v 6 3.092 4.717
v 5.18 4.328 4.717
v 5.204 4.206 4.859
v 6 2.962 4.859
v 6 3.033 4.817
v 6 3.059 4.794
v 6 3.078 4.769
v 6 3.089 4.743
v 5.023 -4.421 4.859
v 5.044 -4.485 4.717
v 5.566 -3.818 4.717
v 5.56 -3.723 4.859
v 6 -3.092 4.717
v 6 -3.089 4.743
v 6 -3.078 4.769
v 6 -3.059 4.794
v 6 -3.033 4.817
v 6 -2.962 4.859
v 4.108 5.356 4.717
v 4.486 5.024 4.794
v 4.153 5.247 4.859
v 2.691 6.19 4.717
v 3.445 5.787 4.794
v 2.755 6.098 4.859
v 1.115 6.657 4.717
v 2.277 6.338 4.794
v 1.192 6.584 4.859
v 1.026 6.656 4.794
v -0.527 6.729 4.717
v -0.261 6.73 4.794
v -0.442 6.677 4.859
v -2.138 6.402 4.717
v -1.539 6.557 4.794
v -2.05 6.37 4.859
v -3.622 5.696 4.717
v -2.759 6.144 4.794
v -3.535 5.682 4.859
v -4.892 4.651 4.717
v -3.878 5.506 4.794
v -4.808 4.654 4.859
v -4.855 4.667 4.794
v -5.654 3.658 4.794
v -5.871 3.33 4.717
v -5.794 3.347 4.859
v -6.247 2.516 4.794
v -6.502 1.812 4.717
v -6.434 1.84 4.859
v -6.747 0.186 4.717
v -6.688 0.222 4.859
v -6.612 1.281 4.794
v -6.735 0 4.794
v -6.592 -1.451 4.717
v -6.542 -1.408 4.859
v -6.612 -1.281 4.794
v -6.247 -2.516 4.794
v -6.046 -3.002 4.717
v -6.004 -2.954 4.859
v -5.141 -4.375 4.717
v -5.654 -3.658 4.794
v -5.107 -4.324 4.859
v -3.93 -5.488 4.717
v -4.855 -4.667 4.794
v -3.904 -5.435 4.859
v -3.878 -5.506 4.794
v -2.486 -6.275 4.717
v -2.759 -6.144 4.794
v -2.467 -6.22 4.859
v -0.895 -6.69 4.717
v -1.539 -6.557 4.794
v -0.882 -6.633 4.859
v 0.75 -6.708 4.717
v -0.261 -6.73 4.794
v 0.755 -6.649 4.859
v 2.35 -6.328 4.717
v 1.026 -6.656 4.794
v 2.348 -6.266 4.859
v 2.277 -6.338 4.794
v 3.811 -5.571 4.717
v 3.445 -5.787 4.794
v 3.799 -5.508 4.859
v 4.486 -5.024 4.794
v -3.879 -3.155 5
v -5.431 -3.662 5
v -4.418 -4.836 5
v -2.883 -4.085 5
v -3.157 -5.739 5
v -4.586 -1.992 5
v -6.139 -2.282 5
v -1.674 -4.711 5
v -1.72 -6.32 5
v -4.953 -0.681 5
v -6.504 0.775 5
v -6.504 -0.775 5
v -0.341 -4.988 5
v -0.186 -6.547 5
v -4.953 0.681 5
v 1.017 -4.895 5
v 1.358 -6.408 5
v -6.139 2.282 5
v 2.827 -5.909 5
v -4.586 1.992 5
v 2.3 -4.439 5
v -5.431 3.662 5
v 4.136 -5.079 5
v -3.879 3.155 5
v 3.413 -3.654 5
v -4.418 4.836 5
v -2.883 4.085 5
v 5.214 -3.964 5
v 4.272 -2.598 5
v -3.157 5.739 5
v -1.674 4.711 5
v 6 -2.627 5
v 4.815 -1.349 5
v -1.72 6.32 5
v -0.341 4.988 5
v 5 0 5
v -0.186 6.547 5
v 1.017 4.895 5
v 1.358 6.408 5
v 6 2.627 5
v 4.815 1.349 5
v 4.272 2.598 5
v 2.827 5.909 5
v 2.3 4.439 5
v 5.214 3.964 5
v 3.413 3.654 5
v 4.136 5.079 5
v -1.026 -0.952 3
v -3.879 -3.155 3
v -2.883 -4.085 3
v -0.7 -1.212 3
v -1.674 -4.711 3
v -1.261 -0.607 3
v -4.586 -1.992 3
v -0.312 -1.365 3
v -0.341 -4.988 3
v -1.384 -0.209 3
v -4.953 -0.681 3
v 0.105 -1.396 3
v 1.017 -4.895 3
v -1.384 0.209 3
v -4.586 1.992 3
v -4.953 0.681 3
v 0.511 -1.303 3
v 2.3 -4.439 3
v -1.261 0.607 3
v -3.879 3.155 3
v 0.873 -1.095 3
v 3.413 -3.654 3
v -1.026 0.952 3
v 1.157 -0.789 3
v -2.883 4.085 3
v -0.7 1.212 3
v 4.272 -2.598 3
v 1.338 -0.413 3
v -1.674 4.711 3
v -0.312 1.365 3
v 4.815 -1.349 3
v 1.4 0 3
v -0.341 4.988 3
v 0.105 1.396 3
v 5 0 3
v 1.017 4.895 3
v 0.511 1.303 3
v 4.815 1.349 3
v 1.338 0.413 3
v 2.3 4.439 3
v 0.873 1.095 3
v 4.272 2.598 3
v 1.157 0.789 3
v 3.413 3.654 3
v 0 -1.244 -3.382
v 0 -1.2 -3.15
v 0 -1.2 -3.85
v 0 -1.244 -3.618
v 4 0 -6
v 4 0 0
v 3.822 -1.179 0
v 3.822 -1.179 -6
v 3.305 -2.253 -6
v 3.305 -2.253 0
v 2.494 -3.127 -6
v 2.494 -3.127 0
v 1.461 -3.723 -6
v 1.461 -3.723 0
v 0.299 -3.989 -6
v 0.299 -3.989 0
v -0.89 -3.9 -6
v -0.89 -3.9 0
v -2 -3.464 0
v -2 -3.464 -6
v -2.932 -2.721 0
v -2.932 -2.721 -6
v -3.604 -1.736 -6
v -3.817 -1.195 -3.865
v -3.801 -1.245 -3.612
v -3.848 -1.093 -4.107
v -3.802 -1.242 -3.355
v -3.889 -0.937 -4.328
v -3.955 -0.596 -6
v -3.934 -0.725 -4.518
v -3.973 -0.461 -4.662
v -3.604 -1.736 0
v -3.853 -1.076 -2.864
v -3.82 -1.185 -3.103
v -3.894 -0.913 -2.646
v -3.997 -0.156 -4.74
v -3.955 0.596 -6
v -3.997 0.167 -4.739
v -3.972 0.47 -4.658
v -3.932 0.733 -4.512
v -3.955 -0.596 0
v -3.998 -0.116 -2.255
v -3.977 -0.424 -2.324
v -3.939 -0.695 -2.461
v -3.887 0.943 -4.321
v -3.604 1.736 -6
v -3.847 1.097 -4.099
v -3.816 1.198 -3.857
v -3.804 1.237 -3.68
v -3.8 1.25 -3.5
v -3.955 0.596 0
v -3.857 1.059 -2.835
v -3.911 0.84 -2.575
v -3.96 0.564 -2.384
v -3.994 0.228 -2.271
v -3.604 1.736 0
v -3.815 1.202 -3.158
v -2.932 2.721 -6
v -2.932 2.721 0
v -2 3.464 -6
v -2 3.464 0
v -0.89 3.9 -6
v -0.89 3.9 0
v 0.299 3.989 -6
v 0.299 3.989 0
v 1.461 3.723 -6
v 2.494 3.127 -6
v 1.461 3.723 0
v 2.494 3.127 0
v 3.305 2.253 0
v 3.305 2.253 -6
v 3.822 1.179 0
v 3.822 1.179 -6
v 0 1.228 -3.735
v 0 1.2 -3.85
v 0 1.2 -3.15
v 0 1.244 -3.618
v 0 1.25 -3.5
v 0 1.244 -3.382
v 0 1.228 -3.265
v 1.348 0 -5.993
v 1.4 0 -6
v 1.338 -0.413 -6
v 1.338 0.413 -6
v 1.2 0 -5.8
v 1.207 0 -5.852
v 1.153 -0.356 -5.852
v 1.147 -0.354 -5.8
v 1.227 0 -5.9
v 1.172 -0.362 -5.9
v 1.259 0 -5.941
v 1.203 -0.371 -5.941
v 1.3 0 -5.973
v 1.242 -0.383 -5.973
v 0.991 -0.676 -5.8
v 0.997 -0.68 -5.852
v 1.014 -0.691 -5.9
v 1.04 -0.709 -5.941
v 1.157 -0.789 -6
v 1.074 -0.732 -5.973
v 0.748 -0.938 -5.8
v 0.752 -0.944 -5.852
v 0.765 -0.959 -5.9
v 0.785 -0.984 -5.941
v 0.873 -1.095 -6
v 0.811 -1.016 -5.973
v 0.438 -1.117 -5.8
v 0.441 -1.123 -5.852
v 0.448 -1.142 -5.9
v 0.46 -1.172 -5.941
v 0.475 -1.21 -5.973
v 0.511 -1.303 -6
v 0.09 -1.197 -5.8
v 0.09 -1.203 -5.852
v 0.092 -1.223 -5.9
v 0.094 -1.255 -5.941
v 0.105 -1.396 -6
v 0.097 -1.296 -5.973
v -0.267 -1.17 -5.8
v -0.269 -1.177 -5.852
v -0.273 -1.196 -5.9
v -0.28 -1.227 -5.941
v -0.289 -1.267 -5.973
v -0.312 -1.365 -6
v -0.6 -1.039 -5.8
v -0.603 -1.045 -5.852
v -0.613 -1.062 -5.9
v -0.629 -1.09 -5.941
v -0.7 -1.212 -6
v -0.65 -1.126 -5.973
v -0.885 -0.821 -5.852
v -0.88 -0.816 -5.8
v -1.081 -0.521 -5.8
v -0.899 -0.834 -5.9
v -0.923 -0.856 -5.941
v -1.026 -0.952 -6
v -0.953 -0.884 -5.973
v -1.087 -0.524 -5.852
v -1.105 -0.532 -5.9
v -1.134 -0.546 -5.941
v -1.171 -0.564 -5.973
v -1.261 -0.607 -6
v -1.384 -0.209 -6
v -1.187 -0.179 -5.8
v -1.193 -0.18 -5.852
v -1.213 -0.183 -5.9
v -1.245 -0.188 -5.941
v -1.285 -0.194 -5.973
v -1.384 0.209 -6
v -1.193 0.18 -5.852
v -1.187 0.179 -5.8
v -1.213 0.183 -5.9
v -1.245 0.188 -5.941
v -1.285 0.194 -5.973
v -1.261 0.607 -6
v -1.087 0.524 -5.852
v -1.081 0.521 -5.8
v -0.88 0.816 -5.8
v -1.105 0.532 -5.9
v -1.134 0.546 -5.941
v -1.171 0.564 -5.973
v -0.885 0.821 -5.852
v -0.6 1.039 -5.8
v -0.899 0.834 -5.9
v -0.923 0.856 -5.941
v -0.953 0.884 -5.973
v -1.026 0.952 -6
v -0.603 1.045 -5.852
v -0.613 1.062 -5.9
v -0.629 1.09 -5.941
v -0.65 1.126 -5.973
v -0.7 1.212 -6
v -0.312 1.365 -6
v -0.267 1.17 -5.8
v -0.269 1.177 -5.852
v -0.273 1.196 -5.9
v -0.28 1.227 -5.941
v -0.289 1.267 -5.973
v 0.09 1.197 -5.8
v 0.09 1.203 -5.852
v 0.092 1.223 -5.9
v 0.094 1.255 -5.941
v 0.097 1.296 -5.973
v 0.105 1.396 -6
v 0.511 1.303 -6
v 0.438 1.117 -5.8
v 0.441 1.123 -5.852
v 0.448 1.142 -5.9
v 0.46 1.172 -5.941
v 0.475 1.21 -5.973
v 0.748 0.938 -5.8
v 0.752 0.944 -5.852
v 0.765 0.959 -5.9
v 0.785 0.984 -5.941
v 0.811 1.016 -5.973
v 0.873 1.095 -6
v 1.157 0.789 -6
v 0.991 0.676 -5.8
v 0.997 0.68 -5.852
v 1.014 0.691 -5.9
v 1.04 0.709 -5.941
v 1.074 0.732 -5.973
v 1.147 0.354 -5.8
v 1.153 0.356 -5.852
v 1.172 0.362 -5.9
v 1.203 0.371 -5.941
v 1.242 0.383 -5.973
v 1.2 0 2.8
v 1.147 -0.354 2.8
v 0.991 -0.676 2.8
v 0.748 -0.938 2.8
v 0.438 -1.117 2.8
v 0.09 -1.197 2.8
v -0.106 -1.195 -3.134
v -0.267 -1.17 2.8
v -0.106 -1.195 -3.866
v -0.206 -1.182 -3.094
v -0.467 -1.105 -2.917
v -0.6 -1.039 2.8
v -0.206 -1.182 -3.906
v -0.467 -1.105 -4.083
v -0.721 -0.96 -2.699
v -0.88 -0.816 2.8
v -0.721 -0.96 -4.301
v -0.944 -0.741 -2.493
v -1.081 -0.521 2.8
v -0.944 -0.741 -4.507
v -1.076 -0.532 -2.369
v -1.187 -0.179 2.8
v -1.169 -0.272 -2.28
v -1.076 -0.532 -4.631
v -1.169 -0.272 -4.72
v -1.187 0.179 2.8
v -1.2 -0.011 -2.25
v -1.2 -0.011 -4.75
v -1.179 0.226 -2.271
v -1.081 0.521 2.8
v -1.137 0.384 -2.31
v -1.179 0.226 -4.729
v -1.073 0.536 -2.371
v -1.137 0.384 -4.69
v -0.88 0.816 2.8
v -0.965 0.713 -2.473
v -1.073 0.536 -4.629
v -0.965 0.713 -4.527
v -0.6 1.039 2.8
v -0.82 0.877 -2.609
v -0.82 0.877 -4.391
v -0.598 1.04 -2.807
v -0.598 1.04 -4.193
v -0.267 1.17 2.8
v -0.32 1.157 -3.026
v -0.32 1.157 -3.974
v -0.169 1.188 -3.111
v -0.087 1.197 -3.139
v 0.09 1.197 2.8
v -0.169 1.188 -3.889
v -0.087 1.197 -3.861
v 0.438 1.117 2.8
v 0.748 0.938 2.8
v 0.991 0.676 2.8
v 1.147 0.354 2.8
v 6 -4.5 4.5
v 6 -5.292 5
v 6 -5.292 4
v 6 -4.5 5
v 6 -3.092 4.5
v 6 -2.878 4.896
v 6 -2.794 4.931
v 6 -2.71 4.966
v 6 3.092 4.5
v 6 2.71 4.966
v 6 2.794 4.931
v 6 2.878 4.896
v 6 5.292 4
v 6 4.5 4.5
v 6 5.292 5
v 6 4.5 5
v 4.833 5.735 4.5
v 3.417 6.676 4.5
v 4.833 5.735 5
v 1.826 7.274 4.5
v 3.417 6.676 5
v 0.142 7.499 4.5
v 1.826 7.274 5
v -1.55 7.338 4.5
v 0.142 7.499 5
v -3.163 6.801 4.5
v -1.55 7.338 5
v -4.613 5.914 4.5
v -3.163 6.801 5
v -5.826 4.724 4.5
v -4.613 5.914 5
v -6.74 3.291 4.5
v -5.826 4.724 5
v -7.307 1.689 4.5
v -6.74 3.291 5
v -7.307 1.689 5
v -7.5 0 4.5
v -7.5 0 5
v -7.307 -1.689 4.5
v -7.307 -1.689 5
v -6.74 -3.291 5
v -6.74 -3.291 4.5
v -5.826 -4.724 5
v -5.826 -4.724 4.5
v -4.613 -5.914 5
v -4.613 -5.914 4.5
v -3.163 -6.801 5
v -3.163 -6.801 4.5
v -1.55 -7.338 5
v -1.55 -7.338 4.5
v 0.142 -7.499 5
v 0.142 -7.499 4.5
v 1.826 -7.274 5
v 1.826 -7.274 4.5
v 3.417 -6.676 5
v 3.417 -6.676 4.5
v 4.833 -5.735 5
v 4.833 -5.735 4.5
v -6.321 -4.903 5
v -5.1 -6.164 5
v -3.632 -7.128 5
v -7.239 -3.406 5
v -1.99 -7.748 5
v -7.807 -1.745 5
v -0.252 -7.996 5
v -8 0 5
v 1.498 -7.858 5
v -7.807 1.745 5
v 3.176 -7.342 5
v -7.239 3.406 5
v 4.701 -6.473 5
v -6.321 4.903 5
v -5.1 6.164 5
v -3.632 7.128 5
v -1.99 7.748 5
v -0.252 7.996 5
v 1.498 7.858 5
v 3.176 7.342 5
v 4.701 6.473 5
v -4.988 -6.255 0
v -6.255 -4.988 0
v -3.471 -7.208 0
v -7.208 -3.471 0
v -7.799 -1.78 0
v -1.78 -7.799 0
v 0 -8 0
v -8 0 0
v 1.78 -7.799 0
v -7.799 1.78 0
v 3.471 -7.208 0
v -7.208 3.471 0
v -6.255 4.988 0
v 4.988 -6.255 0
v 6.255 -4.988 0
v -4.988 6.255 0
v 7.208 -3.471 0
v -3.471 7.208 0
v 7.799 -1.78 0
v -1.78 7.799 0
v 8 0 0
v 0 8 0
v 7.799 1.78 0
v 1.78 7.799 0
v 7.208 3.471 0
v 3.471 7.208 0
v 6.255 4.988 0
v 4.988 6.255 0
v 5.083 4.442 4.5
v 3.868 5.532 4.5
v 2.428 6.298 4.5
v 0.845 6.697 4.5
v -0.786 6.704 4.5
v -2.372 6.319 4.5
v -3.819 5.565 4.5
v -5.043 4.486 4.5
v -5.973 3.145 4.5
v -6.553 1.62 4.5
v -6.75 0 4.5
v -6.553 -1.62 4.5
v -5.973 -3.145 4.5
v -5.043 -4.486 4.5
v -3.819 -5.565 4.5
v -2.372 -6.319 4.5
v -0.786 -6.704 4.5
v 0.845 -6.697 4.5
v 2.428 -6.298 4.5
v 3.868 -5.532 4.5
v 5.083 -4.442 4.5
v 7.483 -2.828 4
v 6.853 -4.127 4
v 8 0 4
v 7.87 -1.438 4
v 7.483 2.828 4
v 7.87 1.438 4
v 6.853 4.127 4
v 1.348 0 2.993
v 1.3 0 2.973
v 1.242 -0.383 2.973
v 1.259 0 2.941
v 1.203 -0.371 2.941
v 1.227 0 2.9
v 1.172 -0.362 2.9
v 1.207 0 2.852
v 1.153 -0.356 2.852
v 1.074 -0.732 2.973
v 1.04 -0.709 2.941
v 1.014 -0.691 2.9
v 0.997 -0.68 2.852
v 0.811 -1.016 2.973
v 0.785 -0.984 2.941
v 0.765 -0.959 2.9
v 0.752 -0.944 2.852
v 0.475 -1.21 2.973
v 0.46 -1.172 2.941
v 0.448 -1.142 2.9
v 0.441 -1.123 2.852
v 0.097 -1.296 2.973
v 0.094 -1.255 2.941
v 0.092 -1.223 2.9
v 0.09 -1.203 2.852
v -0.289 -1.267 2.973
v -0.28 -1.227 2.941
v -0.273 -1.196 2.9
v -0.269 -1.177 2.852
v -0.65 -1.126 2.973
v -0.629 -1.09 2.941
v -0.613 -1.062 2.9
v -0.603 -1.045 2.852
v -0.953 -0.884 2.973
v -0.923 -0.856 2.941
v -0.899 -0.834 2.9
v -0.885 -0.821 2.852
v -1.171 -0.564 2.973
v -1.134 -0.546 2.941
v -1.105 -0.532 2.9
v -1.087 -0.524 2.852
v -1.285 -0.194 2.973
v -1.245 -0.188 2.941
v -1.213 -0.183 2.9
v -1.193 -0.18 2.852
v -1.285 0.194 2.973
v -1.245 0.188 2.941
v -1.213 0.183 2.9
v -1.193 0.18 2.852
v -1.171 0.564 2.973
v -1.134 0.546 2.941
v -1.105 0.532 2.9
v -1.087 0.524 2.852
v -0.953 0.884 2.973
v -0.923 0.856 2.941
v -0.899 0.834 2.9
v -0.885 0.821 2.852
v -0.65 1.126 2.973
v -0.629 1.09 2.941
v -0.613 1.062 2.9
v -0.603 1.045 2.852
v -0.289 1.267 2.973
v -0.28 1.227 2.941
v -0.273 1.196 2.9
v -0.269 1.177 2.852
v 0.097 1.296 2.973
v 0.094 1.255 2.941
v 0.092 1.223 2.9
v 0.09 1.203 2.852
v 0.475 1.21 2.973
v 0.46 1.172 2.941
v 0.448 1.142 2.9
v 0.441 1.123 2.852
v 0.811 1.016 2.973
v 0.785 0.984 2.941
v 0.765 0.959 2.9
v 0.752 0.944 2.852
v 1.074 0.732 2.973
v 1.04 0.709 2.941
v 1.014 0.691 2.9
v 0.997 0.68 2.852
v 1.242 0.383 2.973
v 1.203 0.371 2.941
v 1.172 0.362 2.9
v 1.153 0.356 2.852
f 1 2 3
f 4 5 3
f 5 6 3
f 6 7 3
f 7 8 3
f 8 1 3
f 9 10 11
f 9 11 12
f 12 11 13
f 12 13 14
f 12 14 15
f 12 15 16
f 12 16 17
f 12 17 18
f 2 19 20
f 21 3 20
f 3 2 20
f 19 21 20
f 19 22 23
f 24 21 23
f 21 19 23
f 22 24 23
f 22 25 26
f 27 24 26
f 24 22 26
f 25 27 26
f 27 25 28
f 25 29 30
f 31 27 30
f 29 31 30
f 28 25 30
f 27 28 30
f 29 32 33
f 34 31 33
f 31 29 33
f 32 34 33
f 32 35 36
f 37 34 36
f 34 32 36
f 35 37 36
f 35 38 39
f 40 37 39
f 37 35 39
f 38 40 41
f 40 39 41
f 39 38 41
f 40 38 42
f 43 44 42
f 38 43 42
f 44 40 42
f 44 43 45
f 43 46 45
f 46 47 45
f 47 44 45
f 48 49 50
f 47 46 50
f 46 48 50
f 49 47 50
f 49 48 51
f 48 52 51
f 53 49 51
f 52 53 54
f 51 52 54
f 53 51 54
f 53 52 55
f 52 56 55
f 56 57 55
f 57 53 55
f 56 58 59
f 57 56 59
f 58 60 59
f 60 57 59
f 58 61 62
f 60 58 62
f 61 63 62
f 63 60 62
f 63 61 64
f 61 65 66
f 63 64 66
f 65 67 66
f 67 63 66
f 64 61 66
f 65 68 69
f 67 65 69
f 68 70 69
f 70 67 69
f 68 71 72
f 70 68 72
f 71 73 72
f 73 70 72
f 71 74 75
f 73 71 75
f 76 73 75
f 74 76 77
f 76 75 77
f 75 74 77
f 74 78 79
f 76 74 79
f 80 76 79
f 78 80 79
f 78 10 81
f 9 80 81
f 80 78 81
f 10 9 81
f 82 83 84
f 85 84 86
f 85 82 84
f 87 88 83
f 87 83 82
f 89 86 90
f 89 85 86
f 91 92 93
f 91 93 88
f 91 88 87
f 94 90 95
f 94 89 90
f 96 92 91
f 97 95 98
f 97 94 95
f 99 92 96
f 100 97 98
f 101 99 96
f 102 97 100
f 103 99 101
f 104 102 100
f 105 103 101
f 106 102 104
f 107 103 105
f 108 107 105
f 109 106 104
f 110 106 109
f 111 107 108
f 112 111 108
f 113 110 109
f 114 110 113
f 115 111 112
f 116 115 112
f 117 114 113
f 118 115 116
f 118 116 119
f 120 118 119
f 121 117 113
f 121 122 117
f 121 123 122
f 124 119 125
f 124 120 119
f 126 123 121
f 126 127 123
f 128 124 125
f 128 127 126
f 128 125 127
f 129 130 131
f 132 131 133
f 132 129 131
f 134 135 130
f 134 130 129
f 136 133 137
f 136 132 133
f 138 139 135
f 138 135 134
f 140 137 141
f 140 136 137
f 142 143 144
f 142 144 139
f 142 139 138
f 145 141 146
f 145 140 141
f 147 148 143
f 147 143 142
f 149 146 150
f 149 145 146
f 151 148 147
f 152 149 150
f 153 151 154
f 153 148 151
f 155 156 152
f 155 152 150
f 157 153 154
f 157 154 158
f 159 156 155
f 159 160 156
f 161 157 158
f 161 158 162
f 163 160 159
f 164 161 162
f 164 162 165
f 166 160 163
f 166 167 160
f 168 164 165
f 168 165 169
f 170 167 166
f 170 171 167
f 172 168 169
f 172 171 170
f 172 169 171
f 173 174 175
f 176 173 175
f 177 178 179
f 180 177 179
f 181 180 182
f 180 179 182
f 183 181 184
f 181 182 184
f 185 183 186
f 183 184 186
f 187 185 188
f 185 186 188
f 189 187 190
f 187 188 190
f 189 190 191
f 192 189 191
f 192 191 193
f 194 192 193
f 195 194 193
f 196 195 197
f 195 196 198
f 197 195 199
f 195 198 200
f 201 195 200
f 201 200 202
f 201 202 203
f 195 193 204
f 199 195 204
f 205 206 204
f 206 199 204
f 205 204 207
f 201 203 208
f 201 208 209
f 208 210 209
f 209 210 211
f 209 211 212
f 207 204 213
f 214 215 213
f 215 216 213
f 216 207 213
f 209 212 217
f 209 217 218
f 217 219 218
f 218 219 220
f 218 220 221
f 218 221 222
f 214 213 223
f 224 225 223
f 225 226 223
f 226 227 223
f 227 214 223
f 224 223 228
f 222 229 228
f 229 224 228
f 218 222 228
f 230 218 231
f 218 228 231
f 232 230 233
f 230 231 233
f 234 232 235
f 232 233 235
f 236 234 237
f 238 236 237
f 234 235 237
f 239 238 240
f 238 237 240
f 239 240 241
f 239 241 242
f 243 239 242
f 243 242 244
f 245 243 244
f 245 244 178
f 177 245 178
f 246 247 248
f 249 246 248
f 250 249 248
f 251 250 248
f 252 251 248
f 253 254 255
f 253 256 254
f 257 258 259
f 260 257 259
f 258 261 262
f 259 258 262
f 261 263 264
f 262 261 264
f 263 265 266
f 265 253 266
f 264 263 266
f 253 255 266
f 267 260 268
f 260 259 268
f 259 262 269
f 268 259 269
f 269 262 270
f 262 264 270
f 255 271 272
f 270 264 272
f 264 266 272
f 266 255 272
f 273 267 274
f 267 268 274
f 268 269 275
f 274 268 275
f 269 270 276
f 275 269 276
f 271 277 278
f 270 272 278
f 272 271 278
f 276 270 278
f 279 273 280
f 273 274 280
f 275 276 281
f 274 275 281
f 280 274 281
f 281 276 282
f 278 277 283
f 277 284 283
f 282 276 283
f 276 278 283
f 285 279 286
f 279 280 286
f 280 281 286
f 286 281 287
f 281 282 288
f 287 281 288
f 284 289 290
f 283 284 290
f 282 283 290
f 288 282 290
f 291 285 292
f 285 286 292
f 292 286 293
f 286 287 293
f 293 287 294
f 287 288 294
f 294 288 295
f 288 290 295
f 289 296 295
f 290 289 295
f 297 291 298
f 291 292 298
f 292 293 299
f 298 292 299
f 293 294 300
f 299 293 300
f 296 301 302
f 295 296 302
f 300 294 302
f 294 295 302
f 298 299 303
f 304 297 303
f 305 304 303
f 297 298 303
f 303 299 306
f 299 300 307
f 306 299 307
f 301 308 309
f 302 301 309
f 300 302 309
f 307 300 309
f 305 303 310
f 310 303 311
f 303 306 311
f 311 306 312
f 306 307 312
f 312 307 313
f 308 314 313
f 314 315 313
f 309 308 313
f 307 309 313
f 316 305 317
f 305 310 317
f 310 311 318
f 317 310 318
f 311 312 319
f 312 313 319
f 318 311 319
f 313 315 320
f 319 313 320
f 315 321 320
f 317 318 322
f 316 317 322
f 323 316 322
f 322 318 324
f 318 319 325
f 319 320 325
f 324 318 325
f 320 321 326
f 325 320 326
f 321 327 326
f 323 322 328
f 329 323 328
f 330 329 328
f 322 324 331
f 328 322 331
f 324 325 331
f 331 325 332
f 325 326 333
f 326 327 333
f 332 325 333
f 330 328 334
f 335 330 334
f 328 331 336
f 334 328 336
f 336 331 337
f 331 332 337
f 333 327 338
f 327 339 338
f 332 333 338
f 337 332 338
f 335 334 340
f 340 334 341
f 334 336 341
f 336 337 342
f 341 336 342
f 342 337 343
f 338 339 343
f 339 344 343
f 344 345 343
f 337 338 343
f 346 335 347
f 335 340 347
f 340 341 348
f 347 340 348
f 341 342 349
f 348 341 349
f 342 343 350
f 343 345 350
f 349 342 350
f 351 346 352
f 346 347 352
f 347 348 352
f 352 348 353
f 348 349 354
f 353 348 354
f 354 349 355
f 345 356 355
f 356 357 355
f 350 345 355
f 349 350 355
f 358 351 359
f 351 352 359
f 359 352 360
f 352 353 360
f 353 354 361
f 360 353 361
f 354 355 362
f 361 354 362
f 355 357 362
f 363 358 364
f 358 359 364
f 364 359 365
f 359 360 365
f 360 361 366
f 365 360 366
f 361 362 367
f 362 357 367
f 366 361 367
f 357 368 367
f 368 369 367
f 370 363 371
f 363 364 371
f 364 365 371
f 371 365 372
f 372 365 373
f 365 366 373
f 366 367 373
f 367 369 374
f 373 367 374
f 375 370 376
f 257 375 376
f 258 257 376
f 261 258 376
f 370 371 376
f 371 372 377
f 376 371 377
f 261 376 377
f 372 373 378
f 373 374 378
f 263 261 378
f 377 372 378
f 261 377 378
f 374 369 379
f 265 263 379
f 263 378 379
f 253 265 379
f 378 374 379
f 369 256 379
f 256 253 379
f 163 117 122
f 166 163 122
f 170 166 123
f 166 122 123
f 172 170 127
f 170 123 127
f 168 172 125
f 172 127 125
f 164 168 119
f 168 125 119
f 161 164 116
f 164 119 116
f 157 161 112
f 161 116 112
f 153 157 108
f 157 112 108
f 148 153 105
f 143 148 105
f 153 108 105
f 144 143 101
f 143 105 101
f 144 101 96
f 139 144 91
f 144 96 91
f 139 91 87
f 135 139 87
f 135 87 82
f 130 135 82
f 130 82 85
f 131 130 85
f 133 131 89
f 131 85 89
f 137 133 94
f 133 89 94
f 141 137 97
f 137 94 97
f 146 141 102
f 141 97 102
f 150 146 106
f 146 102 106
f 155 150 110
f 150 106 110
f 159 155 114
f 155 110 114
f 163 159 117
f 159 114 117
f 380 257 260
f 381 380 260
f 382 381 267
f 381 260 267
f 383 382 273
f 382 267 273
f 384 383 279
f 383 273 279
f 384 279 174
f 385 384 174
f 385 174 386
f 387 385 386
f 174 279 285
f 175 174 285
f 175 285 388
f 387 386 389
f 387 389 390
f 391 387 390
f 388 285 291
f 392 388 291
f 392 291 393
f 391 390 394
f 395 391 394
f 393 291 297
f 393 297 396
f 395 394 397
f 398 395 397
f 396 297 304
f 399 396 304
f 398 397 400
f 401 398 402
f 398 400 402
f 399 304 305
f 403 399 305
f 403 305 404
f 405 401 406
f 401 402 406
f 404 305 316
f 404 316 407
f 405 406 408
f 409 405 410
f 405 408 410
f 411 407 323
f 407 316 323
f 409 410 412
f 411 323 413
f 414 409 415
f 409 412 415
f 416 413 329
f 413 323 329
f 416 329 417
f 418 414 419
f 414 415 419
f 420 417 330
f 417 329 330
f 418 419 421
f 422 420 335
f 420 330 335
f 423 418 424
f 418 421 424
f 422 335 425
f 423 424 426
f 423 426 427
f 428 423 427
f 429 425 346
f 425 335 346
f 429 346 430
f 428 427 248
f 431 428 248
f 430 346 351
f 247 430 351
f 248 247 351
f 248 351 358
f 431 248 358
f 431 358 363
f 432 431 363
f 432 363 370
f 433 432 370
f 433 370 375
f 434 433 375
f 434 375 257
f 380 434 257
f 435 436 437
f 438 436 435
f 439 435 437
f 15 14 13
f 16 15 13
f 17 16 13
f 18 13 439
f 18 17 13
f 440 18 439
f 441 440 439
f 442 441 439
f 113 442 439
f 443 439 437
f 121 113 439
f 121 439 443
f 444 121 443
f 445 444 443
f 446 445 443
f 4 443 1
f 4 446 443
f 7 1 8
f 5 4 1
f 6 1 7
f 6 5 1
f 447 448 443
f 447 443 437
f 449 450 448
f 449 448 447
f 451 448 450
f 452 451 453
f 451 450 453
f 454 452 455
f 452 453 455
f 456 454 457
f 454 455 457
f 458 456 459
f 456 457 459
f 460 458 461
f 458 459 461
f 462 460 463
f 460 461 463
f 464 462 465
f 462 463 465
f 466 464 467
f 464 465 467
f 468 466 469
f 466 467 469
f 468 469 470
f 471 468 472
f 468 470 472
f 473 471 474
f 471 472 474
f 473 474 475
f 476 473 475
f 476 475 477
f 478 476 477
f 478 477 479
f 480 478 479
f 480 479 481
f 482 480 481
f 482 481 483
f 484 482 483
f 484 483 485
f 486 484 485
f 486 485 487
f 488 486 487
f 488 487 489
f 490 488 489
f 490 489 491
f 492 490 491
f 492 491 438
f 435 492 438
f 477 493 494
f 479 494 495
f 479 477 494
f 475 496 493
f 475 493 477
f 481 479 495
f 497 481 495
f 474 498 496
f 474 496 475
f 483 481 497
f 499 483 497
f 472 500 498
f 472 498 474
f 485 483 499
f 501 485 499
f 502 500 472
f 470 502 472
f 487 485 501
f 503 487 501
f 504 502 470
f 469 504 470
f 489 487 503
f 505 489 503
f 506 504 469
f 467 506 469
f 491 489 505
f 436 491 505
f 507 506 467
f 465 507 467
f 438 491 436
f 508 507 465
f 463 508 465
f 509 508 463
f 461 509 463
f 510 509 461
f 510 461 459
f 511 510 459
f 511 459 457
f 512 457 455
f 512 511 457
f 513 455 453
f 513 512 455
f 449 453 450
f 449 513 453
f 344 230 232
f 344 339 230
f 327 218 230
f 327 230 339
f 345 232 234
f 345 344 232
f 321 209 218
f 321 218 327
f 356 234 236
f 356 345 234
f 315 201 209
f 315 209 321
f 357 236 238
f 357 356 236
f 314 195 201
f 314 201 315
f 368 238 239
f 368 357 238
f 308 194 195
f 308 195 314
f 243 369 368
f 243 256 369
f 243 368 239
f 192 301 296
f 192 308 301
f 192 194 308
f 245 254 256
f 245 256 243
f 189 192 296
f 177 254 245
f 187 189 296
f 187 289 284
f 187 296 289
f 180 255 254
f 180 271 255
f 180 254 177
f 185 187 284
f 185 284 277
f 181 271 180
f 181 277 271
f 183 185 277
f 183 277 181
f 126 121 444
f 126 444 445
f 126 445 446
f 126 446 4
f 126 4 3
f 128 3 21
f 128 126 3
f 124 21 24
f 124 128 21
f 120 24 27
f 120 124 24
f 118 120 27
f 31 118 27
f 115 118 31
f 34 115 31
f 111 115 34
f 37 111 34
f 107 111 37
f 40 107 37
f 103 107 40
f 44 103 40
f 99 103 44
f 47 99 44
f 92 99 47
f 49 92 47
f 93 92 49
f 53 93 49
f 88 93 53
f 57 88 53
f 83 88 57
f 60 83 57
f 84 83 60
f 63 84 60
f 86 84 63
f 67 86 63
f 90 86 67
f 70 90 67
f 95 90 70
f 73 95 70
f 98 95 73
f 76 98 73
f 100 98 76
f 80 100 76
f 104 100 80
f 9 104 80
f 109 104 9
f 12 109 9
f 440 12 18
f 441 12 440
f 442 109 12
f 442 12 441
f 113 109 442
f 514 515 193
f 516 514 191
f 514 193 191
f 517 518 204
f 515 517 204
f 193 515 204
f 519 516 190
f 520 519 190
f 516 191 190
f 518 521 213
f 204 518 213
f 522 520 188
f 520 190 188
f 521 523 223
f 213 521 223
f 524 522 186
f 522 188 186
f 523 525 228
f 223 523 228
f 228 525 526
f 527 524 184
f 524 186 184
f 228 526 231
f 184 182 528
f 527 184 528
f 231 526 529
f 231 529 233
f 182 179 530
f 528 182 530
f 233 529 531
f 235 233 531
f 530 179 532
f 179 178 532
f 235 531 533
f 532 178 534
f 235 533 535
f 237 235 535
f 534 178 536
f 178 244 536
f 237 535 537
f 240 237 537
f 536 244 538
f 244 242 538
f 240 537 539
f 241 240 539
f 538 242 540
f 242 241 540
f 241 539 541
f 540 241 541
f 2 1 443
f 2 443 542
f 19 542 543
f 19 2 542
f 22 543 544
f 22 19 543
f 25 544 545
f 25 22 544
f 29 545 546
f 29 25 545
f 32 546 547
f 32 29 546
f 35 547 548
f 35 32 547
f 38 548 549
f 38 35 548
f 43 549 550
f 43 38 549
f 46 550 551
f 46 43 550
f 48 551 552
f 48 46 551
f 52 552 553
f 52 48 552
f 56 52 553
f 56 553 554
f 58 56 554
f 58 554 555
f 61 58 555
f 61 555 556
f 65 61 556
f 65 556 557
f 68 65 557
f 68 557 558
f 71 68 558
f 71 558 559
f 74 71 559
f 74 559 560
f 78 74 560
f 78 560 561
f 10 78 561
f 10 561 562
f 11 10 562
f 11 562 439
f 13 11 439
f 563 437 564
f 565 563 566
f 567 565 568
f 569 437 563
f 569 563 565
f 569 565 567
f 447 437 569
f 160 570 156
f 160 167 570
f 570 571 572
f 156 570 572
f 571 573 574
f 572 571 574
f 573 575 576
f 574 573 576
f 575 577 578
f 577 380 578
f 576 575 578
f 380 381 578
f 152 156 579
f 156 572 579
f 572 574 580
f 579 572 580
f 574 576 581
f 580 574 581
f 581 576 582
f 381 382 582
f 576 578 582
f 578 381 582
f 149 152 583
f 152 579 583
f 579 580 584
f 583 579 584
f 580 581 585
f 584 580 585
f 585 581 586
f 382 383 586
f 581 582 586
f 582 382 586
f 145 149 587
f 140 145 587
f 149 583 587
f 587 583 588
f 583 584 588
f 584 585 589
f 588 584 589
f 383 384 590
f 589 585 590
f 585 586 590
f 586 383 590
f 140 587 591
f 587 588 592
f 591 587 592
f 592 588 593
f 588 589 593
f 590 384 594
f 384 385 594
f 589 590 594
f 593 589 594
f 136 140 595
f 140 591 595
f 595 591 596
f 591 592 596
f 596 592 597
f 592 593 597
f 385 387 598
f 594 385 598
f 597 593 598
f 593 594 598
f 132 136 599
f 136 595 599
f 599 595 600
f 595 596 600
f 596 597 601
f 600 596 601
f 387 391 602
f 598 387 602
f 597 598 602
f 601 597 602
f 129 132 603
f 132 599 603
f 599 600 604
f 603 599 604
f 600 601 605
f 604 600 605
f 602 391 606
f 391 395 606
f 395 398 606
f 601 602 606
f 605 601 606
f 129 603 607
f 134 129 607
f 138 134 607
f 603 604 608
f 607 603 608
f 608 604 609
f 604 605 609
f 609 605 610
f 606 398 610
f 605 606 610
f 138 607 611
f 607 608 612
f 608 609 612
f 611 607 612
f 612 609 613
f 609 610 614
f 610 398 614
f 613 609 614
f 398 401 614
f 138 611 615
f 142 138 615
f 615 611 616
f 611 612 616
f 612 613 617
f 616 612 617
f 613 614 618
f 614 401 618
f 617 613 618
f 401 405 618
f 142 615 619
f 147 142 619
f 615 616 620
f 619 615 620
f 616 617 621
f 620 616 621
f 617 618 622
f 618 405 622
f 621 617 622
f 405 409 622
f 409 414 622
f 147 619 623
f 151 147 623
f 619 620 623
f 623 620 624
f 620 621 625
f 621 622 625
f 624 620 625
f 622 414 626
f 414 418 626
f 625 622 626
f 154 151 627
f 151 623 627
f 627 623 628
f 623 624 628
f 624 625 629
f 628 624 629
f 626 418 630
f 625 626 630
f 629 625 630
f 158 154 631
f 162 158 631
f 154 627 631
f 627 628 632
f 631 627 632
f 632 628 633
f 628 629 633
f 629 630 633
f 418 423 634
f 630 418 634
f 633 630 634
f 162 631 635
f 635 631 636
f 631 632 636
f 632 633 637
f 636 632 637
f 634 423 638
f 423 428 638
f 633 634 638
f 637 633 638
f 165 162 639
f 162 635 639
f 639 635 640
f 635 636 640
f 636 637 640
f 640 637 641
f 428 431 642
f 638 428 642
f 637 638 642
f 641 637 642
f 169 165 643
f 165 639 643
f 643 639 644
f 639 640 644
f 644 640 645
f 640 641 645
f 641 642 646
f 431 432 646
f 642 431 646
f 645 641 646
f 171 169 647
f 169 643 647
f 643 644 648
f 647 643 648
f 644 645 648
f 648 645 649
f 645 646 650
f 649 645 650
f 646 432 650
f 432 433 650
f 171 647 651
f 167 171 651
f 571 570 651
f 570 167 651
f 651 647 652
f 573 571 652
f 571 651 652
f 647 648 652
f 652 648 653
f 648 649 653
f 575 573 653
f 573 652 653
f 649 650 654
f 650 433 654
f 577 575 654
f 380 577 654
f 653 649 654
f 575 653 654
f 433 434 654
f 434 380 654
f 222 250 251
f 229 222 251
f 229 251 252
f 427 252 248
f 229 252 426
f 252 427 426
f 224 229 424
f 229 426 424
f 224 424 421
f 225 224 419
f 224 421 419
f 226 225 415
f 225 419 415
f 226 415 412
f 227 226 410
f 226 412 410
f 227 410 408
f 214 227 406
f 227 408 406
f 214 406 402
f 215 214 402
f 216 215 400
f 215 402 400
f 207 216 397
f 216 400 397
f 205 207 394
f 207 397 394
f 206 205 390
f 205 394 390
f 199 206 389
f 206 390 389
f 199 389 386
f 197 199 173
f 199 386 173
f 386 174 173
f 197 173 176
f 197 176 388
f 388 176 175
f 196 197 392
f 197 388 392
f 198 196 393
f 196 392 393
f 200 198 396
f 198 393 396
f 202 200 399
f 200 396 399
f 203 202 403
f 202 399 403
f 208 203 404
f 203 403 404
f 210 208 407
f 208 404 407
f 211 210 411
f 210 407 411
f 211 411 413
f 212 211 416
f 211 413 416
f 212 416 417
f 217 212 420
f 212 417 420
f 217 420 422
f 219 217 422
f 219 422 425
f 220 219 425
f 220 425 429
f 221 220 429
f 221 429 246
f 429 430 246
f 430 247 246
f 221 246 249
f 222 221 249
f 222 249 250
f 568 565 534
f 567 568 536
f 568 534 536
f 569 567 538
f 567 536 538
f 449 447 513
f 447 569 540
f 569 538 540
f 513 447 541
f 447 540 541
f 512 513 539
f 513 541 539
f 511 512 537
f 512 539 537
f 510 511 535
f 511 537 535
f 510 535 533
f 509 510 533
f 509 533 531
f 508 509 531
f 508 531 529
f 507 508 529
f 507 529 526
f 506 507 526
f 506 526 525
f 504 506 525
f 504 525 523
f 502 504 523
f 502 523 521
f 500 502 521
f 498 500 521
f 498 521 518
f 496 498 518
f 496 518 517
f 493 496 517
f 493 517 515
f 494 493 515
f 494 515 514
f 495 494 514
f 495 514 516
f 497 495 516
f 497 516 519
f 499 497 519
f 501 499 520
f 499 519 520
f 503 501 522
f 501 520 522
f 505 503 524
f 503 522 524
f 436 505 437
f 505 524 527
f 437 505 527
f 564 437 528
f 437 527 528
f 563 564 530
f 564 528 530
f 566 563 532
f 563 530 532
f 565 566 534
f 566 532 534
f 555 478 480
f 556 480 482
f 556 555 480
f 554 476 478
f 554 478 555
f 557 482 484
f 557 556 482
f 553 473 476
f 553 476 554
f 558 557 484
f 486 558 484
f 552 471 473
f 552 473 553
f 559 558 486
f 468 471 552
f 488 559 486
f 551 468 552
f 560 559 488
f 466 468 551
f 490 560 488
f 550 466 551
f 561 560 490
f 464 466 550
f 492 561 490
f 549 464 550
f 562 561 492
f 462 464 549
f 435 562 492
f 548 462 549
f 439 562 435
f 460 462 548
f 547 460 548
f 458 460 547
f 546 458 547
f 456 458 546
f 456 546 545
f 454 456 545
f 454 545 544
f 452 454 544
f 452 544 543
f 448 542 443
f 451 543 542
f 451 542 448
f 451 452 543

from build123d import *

# Parameters (mm, degrees)
F0_R      = 8
F1_DEPTH  = 5
F2_R      = 4
F3_DEPTH  = 6
F4_R      = 1.2
F5_DEPTH  = 9
F6_R      = 5
F7_DEPTH  = 2
F8_R      = 7.5
F8_R_2    = 6.75
F9_DEPTH  = 0.5
F10_SIZE  = 0.2
F11_R     = 0.2
F13_R     = 1.25
F14_DEPTH = 4.5
F15_W     = 2
F15_H     = 12
F16_DEPTH = 1


with BuildPart() as f1:
    # F0 (on Top) → F1 (new body)
    with BuildSketch(Plane.XY):
        Circle(F0_R)
    extrude(amount=F1_DEPTH)

    # F2 (on face) → F3 (join)
    with BuildSketch(Plane(origin=(0, 0, 0), x_dir=(1, 0, 0), z_dir=(0, 0, -1))):
        Circle(F2_R)
    extrude(amount=F3_DEPTH)

    # F4 (on face) → F5 (cut)
    with BuildSketch(Plane(origin=(0, 0, -6), x_dir=(1, 0, 0), z_dir=(0, 0, -1))):
        Circle(F4_R)
    extrude(amount=-F5_DEPTH, mode=Mode.SUBTRACT)

    # F6 (on face) → F7 (cut)
    with BuildSketch(Plane.XY.offset(5)):
        Circle(F6_R)
    extrude(amount=-F7_DEPTH, mode=Mode.SUBTRACT)

    # F8 (on face) → F9 (cut)
    with BuildSketch(Plane.XY.offset(5)):
        Circle(F8_R)
        Circle(F8_R_2, mode=Mode.SUBTRACT)
    extrude(amount=-F9_DEPTH, mode=Mode.SUBTRACT)

    # F10
    f10_edges = [f1.edges().sort_by_distance(p)[0] for p in [
        (-6.75, 0, 5),
    ]]
    chamfer(f10_edges, length=F10_SIZE)

    # F11
    f11_edges = [f1.edges().sort_by_distance(p)[0] for p in [
        (-6.75, 0, 4.8),
        (-1.2, 0, 3),
        (-1.2, 0, -6),
    ]]
    fillet(f11_edges, radius=F11_R)

    # F13 (on Right) → F14 (cut)
    with BuildSketch(Plane.YZ):
        with Locations((0, -3.5)):
            Circle(F13_R)
    extrude(amount=-F14_DEPTH, mode=Mode.SUBTRACT)

    # F15 (on offset) → F16 (cut)
    with BuildSketch(Plane.XY.offset(5)):
        with Locations((7, -0.3699996099)):
            Rectangle(F15_W, F15_H)
    extrude(amount=-F16_DEPTH, mode=Mode.SUBTRACT)


solid = f1.part
